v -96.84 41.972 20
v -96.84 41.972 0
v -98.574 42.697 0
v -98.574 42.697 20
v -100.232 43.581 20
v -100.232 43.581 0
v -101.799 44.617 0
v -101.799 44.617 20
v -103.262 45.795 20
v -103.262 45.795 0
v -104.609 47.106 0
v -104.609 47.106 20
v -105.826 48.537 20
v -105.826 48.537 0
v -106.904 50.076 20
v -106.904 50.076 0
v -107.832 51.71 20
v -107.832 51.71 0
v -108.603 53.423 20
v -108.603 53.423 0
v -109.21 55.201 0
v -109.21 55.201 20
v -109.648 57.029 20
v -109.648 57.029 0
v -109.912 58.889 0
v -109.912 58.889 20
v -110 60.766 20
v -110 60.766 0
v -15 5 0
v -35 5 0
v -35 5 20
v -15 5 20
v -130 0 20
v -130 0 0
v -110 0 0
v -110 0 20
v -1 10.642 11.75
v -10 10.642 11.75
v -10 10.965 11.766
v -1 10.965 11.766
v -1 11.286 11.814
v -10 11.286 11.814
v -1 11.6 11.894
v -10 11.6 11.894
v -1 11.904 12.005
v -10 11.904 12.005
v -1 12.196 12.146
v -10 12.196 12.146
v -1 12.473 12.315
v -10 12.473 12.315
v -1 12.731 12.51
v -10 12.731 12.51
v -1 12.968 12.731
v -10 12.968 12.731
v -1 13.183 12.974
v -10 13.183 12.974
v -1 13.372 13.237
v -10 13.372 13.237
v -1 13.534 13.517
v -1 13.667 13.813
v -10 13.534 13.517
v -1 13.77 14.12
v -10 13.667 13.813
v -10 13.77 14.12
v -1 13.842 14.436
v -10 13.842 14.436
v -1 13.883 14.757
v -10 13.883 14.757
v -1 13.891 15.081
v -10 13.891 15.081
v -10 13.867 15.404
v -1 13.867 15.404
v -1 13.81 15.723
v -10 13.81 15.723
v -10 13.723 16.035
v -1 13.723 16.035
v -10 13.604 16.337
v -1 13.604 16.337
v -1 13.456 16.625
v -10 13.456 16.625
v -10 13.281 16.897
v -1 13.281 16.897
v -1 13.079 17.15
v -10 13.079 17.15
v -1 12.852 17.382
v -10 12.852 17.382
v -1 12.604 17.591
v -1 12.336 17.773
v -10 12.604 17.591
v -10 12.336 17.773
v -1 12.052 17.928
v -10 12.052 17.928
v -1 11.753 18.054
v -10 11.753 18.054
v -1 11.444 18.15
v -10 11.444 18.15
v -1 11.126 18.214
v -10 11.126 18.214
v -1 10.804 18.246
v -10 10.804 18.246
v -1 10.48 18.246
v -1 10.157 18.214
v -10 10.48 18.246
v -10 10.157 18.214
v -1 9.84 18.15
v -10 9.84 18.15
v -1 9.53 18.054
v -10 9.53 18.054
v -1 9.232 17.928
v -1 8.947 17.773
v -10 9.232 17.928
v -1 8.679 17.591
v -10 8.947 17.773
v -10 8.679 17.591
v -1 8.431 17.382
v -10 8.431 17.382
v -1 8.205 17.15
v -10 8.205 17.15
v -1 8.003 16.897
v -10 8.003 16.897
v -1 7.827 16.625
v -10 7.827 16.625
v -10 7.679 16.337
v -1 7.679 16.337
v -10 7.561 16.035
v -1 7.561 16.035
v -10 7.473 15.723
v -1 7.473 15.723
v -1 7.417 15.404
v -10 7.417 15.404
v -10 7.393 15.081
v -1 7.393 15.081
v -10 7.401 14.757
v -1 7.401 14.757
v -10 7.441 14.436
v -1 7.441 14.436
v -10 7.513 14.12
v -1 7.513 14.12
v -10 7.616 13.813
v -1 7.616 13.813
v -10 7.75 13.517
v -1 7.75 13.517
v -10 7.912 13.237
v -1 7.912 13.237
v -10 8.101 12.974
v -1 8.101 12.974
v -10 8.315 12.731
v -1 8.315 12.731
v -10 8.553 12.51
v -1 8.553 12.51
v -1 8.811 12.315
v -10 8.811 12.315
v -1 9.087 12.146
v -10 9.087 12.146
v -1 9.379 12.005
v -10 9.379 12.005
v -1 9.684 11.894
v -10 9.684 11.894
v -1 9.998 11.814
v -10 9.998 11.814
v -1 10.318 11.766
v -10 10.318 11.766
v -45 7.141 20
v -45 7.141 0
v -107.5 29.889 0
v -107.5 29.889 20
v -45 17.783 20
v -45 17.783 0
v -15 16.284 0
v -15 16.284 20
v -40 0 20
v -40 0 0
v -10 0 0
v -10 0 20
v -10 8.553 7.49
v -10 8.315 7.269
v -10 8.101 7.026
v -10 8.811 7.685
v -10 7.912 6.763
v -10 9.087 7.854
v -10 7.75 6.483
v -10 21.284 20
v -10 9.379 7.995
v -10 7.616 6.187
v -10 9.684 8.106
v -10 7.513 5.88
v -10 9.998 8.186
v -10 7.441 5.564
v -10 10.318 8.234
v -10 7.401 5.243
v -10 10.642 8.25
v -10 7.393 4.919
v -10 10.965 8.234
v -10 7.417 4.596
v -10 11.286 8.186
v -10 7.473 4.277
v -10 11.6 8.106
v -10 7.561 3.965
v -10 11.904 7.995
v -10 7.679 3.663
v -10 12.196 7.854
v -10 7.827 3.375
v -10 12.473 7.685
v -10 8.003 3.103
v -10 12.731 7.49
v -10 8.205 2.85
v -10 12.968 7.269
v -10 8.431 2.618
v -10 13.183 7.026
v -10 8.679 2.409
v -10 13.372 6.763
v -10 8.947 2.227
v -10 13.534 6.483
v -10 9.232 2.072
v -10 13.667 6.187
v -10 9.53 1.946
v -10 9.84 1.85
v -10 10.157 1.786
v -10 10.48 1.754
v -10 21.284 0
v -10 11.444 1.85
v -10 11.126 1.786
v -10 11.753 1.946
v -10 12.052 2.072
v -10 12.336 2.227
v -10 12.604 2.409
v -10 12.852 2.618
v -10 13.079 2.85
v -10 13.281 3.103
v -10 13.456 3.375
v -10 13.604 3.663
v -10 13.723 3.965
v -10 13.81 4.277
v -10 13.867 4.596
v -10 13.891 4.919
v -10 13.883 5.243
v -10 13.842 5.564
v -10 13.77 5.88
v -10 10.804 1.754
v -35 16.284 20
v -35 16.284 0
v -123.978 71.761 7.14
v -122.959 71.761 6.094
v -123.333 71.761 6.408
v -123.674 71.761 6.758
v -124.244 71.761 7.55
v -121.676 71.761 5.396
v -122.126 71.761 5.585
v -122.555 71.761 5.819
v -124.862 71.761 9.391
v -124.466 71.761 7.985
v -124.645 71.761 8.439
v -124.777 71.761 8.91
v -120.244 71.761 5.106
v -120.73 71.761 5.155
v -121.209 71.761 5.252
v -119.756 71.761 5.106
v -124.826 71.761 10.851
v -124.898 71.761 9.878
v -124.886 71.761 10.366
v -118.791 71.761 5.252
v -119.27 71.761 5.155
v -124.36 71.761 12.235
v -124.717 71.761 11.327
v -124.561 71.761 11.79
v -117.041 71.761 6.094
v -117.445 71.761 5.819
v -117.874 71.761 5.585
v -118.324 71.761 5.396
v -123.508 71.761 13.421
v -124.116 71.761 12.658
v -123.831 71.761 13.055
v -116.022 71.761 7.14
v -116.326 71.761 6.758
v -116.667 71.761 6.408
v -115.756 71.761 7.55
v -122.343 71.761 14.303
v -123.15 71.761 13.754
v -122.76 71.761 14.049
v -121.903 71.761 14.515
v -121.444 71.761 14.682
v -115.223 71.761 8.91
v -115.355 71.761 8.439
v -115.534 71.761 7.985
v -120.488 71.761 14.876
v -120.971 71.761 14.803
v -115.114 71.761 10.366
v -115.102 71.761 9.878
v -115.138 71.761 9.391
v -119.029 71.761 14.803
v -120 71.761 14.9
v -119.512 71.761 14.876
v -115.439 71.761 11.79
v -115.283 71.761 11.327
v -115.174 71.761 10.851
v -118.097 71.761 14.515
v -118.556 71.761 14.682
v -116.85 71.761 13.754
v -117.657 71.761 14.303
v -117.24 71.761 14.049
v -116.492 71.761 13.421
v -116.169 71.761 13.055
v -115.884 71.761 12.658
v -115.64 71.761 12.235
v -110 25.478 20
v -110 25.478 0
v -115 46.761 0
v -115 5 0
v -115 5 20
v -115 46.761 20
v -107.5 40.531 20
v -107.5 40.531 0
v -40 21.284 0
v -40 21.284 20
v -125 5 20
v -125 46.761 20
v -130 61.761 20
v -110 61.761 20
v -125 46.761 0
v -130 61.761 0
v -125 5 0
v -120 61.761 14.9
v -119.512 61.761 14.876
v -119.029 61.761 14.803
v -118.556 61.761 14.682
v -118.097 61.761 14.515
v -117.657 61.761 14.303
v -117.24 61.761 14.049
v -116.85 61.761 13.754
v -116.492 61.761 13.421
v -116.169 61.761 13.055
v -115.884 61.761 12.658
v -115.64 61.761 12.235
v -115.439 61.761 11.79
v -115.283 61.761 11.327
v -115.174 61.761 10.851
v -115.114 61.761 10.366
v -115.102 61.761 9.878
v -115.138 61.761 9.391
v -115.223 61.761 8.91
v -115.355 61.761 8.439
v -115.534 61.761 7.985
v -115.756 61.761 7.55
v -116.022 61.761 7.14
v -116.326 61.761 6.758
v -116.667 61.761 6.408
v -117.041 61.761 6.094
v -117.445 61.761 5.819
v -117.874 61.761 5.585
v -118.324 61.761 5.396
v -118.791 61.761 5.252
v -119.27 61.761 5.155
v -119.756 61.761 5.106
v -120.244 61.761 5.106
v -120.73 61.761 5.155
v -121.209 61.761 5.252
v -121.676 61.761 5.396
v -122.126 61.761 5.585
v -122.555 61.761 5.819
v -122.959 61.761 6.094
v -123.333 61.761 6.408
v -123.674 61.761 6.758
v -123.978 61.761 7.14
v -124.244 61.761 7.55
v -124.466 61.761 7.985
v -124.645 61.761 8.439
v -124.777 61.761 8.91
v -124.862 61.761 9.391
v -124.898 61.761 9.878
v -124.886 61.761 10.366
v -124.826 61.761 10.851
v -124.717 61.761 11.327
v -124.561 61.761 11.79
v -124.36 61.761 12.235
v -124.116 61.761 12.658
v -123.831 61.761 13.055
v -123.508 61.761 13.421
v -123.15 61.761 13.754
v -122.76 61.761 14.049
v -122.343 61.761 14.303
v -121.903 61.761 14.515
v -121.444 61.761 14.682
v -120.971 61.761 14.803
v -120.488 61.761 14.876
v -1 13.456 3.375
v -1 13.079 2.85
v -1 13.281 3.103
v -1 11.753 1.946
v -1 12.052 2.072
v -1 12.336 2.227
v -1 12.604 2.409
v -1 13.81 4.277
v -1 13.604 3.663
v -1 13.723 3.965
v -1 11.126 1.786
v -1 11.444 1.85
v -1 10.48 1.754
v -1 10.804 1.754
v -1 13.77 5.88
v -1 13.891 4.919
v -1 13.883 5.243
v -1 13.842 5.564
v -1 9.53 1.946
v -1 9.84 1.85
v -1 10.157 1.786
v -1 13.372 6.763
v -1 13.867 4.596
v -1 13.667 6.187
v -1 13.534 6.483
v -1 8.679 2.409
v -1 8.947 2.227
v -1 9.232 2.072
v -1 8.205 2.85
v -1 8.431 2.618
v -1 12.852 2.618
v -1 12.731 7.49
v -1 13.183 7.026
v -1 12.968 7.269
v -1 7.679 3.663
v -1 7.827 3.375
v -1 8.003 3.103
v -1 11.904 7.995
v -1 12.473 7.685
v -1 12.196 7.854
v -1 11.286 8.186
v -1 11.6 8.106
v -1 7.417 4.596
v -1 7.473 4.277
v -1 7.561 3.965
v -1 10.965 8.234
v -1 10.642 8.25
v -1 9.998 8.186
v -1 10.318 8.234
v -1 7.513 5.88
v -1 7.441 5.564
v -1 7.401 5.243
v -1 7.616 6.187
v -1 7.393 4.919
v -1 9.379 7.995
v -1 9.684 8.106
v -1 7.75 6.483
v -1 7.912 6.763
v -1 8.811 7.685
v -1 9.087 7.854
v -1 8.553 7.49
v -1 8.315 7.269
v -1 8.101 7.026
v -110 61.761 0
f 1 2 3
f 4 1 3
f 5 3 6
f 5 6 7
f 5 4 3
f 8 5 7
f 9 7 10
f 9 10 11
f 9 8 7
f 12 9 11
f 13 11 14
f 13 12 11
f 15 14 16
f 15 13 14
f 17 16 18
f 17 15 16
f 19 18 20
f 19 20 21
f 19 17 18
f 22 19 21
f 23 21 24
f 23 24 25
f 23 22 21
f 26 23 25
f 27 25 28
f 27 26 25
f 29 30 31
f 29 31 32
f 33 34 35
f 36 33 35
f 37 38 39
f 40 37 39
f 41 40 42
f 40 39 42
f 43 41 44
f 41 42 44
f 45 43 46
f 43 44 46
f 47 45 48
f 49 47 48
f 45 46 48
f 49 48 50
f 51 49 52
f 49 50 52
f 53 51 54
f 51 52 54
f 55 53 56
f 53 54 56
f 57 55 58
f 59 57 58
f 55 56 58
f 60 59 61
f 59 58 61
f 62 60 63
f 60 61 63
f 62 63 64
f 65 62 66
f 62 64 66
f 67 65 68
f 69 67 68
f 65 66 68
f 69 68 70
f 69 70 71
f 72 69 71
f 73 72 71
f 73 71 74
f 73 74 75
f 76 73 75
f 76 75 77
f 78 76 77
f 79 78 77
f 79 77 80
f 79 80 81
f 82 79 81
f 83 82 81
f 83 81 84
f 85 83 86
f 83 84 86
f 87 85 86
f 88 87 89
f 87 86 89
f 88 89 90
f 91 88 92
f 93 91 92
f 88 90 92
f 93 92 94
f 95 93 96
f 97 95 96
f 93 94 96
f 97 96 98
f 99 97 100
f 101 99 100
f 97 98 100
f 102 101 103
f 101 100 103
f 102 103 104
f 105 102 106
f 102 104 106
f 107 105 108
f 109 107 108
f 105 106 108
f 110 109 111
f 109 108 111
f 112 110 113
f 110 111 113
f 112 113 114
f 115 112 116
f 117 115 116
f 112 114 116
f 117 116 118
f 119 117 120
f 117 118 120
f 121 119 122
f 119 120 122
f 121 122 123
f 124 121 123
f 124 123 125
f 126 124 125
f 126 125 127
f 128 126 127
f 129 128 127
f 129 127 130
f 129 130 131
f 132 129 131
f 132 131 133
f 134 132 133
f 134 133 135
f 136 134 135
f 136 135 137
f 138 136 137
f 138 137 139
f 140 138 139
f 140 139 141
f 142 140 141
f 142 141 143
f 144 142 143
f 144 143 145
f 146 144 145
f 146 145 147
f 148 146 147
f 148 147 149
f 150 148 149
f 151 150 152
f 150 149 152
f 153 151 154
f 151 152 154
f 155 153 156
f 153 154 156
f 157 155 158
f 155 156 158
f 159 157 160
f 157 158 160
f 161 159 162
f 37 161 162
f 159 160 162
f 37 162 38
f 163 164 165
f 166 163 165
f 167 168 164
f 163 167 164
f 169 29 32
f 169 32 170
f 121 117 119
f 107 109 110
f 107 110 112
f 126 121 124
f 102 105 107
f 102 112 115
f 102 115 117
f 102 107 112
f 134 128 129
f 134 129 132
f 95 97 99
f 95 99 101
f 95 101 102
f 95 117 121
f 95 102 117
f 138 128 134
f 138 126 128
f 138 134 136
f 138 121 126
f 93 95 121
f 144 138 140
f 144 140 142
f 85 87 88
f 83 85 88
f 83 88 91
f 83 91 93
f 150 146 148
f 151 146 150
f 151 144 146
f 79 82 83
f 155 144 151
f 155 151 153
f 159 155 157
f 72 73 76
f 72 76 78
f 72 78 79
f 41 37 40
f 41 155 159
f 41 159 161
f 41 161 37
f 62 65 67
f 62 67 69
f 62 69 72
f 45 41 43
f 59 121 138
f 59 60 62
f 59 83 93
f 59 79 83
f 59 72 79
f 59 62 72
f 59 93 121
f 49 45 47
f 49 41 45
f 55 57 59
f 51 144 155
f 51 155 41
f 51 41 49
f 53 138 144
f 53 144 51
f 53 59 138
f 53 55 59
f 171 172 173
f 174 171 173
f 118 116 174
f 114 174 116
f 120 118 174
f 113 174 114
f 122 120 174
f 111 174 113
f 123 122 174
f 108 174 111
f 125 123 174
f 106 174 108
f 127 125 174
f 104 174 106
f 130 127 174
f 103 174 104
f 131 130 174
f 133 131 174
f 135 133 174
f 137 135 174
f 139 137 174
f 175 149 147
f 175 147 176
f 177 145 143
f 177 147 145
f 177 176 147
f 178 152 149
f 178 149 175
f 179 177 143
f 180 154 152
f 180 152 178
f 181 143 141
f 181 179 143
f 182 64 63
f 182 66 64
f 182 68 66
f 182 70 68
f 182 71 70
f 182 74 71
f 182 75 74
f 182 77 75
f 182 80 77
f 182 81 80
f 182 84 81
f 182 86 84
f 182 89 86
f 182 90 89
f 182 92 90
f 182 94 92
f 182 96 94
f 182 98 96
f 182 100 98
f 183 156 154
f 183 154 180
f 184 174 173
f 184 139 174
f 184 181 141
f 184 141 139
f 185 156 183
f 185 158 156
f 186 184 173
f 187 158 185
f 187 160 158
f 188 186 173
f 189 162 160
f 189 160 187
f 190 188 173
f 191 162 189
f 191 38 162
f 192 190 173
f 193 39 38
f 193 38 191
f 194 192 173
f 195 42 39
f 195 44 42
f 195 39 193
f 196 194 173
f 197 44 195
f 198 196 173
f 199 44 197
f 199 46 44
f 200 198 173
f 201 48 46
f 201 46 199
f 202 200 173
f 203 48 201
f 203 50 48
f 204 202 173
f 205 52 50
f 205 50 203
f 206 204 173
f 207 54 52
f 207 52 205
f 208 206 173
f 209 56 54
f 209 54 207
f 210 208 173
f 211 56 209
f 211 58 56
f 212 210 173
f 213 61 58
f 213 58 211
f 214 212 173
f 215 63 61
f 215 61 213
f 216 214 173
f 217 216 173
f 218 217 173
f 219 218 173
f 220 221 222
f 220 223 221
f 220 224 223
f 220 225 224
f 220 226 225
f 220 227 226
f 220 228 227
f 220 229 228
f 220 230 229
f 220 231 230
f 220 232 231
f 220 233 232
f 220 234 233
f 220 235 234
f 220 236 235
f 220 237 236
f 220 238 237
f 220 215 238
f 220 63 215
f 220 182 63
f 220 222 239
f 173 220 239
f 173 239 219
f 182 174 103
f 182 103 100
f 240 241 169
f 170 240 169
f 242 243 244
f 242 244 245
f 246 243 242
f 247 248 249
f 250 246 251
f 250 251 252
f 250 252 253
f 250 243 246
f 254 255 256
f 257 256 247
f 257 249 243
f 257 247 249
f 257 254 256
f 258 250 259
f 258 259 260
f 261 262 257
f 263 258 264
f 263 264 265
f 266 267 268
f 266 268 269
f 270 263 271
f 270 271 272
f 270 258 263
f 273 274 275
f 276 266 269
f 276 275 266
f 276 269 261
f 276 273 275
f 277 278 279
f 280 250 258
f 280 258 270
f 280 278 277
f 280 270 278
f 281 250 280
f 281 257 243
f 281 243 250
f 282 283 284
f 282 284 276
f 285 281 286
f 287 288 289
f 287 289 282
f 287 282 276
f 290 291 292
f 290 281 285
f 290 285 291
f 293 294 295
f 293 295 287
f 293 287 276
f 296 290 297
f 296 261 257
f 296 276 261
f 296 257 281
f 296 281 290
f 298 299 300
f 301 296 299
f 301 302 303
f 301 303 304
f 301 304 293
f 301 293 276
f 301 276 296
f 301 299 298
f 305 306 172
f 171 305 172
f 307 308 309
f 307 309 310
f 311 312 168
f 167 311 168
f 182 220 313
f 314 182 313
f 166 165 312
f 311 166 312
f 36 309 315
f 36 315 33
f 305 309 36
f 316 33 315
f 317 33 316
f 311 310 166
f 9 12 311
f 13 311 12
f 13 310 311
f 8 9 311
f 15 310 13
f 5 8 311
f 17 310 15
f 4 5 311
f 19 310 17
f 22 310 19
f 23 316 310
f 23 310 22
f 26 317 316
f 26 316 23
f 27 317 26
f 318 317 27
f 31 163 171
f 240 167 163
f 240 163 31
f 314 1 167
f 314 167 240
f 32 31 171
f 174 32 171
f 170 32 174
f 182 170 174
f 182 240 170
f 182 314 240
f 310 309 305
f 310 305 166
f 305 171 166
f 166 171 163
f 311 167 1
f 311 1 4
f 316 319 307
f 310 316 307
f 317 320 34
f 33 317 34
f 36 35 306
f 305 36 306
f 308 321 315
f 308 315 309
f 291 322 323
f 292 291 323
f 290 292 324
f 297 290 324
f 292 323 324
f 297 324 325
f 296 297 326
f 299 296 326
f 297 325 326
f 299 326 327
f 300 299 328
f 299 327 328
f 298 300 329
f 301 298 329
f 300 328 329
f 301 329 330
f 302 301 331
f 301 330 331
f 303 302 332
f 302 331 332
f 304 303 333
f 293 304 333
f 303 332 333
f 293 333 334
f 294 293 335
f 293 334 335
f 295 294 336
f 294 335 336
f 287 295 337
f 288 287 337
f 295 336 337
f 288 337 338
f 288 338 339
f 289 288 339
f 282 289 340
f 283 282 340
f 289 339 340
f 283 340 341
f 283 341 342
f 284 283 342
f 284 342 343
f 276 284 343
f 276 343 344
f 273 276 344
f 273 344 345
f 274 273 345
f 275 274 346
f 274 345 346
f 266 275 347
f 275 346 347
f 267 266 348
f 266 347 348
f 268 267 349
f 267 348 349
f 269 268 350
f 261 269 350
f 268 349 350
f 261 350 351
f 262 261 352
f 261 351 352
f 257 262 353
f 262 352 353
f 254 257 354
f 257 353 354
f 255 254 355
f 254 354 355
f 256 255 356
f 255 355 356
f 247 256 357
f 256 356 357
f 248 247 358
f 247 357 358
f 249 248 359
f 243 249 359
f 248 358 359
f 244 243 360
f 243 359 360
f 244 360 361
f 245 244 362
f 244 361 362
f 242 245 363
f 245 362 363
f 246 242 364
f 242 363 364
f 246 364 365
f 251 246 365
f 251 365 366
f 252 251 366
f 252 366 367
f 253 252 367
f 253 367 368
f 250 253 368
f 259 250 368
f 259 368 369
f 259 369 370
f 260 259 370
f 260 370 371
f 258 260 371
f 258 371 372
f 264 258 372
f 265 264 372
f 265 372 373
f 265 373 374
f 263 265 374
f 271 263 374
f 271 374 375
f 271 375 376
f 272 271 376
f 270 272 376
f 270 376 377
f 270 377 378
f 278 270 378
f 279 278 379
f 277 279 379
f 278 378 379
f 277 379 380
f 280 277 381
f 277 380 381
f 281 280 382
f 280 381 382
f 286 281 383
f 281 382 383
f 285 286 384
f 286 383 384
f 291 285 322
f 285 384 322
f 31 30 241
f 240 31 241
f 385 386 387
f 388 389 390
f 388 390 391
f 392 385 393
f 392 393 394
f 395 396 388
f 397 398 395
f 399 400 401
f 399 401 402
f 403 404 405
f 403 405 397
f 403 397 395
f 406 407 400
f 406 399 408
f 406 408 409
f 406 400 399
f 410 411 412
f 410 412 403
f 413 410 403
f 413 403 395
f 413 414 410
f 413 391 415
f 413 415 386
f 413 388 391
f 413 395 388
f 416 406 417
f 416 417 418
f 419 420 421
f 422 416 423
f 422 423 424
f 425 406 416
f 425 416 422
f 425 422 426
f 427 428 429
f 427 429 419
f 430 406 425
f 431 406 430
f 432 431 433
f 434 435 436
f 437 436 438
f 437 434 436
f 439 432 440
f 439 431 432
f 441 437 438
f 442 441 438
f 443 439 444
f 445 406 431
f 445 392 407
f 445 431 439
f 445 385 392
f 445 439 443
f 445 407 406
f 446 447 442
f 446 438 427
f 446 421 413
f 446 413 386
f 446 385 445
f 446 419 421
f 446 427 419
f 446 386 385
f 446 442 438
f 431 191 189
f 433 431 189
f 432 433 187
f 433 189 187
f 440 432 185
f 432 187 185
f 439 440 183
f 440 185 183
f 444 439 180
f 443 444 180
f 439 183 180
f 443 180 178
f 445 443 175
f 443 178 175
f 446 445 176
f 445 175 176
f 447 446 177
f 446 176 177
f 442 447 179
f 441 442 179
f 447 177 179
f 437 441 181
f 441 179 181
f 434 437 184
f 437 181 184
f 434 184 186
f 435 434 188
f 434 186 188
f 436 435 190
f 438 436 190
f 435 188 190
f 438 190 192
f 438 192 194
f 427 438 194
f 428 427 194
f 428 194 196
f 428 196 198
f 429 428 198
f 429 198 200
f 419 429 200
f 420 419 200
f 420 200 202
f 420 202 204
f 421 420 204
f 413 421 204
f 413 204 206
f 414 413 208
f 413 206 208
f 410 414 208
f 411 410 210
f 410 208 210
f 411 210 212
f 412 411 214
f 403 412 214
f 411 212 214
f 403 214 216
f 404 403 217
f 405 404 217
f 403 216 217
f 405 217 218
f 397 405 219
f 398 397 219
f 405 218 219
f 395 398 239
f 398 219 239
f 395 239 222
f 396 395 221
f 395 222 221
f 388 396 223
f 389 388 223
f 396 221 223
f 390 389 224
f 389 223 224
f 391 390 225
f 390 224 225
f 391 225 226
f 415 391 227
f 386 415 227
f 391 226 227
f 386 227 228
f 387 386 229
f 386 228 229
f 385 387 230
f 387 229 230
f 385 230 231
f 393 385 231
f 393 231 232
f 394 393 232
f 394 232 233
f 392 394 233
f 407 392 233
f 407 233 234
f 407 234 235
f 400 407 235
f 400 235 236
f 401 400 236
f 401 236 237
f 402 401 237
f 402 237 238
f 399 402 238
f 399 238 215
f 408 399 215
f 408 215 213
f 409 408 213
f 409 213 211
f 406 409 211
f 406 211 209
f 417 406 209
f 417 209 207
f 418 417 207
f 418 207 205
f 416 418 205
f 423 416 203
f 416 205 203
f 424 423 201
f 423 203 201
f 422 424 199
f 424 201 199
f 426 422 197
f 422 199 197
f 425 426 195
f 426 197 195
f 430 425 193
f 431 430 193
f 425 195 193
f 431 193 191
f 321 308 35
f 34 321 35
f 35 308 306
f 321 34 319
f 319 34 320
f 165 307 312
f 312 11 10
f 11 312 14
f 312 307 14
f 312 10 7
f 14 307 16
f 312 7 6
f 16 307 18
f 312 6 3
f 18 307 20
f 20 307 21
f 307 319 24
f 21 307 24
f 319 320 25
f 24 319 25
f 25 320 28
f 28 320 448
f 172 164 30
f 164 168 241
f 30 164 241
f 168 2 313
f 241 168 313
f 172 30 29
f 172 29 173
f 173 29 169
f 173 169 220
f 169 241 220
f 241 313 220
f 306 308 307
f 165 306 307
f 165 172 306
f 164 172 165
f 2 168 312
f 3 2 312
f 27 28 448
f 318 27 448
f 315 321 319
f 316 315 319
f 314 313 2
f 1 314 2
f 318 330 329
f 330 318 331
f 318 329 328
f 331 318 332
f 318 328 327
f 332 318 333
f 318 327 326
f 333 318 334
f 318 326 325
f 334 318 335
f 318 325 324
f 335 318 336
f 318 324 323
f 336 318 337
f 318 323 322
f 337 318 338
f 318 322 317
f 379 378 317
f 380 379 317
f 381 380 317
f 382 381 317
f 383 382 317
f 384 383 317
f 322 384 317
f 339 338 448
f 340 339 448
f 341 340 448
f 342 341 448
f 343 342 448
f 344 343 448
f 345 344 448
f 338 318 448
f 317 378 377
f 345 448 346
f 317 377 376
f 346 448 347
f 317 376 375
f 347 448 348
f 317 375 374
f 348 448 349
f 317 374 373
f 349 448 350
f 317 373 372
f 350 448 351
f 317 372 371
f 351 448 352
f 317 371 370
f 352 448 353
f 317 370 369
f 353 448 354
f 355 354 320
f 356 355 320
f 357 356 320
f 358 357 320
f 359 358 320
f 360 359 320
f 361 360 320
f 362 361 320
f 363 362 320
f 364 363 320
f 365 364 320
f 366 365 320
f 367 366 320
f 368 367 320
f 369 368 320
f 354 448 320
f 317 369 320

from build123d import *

# Parameters (mm, degrees)
ESQUISSE1_W             = 10
ESQUISSE1_H             = 41.761471848
ESQUISSE1_W_2           = 20
ESQUISSE1_H_2           = 11.28355545
BOSS_EXTRU_1_DEPTH      = 20
CONG_1_R                = 20
ESQUISSE2_R             = 4.9
BOSS_EXTRU_2_DEPTH      = 10
ESQUISSE4_W             = 62.840930267
ESQUISSE4_H             = 35.08297334
ENL_V_MAT_EXTRU_1_DEPTH = 10
ESQUISSE6_R             = 3.25
BOSS_EXTRU_3_DEPTH      = 9


with BuildPart() as part:
    # Esquisse1 → Boss.-Extru.1 (new body)
    with BuildSketch(Plane.XY):
        Polygon((0, 0), (0, 21.28355545), (-40, 21.28355545), (-110, 46.761471848), (-110, 61.761471848), (-130, 61.761471848), (-130, 0), (-110, 0), (-110, 25.477916399), (-40, 0), align=None)
        Polygon((-107.5, 40.5306574), (-45, 17.782517758), (-45, 7.140740034), (-107.5, 29.888879675), align=None, mode=Mode.SUBTRACT)
        with Locations((-120, 25.880735924)):
            Rectangle(ESQUISSE1_W, ESQUISSE1_H, mode=Mode.SUBTRACT)
        with Locations((-25, 10.641777725)):
            Rectangle(ESQUISSE1_W_2, ESQUISSE1_H_2, mode=Mode.SUBTRACT)
    extrude(amount=BOSS_EXTRU_1_DEPTH)

    # Congé1
    cong_1_edges = [part.edges().sort_by_distance(p)[0] for p in [
        (-110, 46.761471848, 10),
    ]]
    fillet(cong_1_edges, radius=CONG_1_R)

    # Esquisse2 → Boss.-Extru.2 (add)
    with BuildSketch(Plane(origin=(0, 61.761471848, 0), x_dir=(1, 0, 0), z_dir=(0, 1, 0))):
        with Locations(Location((-120, -10, 0), (0, 0, 270))):
            Circle(ESQUISSE2_R)
    extrude(amount=BOSS_EXTRU_2_DEPTH)

    # Esquisse4 → Enlèv. mat.-Extru.1 (cut)
    with BuildSketch(Plane(origin=(0, 0, 0), x_dir=(0, 0, -1), z_dir=(1, 0, 0))):
        with Locations((-15.686525899, 12.319682914)):
            Rectangle(ESQUISSE4_W, ESQUISSE4_H)
    extrude(amount=-ENL_V_MAT_EXTRU_1_DEPTH, mode=Mode.SUBTRACT)

    # Esquisse6 → Boss.-Extru.3 (add)
    with BuildSketch(Plane(origin=(-10, 0, 0), x_dir=(0, 0, -1), z_dir=(1, 0, 0))):
        with Locations((-15, 10.641777725)):
            Circle(ESQUISSE6_R)
        with Locations(Location((-5, 10.641777725, 0), (0, 0, 180))):
            Circle(ESQUISSE6_R)
    extrude(amount=BOSS_EXTRU_3_DEPTH)


solid = part.part
